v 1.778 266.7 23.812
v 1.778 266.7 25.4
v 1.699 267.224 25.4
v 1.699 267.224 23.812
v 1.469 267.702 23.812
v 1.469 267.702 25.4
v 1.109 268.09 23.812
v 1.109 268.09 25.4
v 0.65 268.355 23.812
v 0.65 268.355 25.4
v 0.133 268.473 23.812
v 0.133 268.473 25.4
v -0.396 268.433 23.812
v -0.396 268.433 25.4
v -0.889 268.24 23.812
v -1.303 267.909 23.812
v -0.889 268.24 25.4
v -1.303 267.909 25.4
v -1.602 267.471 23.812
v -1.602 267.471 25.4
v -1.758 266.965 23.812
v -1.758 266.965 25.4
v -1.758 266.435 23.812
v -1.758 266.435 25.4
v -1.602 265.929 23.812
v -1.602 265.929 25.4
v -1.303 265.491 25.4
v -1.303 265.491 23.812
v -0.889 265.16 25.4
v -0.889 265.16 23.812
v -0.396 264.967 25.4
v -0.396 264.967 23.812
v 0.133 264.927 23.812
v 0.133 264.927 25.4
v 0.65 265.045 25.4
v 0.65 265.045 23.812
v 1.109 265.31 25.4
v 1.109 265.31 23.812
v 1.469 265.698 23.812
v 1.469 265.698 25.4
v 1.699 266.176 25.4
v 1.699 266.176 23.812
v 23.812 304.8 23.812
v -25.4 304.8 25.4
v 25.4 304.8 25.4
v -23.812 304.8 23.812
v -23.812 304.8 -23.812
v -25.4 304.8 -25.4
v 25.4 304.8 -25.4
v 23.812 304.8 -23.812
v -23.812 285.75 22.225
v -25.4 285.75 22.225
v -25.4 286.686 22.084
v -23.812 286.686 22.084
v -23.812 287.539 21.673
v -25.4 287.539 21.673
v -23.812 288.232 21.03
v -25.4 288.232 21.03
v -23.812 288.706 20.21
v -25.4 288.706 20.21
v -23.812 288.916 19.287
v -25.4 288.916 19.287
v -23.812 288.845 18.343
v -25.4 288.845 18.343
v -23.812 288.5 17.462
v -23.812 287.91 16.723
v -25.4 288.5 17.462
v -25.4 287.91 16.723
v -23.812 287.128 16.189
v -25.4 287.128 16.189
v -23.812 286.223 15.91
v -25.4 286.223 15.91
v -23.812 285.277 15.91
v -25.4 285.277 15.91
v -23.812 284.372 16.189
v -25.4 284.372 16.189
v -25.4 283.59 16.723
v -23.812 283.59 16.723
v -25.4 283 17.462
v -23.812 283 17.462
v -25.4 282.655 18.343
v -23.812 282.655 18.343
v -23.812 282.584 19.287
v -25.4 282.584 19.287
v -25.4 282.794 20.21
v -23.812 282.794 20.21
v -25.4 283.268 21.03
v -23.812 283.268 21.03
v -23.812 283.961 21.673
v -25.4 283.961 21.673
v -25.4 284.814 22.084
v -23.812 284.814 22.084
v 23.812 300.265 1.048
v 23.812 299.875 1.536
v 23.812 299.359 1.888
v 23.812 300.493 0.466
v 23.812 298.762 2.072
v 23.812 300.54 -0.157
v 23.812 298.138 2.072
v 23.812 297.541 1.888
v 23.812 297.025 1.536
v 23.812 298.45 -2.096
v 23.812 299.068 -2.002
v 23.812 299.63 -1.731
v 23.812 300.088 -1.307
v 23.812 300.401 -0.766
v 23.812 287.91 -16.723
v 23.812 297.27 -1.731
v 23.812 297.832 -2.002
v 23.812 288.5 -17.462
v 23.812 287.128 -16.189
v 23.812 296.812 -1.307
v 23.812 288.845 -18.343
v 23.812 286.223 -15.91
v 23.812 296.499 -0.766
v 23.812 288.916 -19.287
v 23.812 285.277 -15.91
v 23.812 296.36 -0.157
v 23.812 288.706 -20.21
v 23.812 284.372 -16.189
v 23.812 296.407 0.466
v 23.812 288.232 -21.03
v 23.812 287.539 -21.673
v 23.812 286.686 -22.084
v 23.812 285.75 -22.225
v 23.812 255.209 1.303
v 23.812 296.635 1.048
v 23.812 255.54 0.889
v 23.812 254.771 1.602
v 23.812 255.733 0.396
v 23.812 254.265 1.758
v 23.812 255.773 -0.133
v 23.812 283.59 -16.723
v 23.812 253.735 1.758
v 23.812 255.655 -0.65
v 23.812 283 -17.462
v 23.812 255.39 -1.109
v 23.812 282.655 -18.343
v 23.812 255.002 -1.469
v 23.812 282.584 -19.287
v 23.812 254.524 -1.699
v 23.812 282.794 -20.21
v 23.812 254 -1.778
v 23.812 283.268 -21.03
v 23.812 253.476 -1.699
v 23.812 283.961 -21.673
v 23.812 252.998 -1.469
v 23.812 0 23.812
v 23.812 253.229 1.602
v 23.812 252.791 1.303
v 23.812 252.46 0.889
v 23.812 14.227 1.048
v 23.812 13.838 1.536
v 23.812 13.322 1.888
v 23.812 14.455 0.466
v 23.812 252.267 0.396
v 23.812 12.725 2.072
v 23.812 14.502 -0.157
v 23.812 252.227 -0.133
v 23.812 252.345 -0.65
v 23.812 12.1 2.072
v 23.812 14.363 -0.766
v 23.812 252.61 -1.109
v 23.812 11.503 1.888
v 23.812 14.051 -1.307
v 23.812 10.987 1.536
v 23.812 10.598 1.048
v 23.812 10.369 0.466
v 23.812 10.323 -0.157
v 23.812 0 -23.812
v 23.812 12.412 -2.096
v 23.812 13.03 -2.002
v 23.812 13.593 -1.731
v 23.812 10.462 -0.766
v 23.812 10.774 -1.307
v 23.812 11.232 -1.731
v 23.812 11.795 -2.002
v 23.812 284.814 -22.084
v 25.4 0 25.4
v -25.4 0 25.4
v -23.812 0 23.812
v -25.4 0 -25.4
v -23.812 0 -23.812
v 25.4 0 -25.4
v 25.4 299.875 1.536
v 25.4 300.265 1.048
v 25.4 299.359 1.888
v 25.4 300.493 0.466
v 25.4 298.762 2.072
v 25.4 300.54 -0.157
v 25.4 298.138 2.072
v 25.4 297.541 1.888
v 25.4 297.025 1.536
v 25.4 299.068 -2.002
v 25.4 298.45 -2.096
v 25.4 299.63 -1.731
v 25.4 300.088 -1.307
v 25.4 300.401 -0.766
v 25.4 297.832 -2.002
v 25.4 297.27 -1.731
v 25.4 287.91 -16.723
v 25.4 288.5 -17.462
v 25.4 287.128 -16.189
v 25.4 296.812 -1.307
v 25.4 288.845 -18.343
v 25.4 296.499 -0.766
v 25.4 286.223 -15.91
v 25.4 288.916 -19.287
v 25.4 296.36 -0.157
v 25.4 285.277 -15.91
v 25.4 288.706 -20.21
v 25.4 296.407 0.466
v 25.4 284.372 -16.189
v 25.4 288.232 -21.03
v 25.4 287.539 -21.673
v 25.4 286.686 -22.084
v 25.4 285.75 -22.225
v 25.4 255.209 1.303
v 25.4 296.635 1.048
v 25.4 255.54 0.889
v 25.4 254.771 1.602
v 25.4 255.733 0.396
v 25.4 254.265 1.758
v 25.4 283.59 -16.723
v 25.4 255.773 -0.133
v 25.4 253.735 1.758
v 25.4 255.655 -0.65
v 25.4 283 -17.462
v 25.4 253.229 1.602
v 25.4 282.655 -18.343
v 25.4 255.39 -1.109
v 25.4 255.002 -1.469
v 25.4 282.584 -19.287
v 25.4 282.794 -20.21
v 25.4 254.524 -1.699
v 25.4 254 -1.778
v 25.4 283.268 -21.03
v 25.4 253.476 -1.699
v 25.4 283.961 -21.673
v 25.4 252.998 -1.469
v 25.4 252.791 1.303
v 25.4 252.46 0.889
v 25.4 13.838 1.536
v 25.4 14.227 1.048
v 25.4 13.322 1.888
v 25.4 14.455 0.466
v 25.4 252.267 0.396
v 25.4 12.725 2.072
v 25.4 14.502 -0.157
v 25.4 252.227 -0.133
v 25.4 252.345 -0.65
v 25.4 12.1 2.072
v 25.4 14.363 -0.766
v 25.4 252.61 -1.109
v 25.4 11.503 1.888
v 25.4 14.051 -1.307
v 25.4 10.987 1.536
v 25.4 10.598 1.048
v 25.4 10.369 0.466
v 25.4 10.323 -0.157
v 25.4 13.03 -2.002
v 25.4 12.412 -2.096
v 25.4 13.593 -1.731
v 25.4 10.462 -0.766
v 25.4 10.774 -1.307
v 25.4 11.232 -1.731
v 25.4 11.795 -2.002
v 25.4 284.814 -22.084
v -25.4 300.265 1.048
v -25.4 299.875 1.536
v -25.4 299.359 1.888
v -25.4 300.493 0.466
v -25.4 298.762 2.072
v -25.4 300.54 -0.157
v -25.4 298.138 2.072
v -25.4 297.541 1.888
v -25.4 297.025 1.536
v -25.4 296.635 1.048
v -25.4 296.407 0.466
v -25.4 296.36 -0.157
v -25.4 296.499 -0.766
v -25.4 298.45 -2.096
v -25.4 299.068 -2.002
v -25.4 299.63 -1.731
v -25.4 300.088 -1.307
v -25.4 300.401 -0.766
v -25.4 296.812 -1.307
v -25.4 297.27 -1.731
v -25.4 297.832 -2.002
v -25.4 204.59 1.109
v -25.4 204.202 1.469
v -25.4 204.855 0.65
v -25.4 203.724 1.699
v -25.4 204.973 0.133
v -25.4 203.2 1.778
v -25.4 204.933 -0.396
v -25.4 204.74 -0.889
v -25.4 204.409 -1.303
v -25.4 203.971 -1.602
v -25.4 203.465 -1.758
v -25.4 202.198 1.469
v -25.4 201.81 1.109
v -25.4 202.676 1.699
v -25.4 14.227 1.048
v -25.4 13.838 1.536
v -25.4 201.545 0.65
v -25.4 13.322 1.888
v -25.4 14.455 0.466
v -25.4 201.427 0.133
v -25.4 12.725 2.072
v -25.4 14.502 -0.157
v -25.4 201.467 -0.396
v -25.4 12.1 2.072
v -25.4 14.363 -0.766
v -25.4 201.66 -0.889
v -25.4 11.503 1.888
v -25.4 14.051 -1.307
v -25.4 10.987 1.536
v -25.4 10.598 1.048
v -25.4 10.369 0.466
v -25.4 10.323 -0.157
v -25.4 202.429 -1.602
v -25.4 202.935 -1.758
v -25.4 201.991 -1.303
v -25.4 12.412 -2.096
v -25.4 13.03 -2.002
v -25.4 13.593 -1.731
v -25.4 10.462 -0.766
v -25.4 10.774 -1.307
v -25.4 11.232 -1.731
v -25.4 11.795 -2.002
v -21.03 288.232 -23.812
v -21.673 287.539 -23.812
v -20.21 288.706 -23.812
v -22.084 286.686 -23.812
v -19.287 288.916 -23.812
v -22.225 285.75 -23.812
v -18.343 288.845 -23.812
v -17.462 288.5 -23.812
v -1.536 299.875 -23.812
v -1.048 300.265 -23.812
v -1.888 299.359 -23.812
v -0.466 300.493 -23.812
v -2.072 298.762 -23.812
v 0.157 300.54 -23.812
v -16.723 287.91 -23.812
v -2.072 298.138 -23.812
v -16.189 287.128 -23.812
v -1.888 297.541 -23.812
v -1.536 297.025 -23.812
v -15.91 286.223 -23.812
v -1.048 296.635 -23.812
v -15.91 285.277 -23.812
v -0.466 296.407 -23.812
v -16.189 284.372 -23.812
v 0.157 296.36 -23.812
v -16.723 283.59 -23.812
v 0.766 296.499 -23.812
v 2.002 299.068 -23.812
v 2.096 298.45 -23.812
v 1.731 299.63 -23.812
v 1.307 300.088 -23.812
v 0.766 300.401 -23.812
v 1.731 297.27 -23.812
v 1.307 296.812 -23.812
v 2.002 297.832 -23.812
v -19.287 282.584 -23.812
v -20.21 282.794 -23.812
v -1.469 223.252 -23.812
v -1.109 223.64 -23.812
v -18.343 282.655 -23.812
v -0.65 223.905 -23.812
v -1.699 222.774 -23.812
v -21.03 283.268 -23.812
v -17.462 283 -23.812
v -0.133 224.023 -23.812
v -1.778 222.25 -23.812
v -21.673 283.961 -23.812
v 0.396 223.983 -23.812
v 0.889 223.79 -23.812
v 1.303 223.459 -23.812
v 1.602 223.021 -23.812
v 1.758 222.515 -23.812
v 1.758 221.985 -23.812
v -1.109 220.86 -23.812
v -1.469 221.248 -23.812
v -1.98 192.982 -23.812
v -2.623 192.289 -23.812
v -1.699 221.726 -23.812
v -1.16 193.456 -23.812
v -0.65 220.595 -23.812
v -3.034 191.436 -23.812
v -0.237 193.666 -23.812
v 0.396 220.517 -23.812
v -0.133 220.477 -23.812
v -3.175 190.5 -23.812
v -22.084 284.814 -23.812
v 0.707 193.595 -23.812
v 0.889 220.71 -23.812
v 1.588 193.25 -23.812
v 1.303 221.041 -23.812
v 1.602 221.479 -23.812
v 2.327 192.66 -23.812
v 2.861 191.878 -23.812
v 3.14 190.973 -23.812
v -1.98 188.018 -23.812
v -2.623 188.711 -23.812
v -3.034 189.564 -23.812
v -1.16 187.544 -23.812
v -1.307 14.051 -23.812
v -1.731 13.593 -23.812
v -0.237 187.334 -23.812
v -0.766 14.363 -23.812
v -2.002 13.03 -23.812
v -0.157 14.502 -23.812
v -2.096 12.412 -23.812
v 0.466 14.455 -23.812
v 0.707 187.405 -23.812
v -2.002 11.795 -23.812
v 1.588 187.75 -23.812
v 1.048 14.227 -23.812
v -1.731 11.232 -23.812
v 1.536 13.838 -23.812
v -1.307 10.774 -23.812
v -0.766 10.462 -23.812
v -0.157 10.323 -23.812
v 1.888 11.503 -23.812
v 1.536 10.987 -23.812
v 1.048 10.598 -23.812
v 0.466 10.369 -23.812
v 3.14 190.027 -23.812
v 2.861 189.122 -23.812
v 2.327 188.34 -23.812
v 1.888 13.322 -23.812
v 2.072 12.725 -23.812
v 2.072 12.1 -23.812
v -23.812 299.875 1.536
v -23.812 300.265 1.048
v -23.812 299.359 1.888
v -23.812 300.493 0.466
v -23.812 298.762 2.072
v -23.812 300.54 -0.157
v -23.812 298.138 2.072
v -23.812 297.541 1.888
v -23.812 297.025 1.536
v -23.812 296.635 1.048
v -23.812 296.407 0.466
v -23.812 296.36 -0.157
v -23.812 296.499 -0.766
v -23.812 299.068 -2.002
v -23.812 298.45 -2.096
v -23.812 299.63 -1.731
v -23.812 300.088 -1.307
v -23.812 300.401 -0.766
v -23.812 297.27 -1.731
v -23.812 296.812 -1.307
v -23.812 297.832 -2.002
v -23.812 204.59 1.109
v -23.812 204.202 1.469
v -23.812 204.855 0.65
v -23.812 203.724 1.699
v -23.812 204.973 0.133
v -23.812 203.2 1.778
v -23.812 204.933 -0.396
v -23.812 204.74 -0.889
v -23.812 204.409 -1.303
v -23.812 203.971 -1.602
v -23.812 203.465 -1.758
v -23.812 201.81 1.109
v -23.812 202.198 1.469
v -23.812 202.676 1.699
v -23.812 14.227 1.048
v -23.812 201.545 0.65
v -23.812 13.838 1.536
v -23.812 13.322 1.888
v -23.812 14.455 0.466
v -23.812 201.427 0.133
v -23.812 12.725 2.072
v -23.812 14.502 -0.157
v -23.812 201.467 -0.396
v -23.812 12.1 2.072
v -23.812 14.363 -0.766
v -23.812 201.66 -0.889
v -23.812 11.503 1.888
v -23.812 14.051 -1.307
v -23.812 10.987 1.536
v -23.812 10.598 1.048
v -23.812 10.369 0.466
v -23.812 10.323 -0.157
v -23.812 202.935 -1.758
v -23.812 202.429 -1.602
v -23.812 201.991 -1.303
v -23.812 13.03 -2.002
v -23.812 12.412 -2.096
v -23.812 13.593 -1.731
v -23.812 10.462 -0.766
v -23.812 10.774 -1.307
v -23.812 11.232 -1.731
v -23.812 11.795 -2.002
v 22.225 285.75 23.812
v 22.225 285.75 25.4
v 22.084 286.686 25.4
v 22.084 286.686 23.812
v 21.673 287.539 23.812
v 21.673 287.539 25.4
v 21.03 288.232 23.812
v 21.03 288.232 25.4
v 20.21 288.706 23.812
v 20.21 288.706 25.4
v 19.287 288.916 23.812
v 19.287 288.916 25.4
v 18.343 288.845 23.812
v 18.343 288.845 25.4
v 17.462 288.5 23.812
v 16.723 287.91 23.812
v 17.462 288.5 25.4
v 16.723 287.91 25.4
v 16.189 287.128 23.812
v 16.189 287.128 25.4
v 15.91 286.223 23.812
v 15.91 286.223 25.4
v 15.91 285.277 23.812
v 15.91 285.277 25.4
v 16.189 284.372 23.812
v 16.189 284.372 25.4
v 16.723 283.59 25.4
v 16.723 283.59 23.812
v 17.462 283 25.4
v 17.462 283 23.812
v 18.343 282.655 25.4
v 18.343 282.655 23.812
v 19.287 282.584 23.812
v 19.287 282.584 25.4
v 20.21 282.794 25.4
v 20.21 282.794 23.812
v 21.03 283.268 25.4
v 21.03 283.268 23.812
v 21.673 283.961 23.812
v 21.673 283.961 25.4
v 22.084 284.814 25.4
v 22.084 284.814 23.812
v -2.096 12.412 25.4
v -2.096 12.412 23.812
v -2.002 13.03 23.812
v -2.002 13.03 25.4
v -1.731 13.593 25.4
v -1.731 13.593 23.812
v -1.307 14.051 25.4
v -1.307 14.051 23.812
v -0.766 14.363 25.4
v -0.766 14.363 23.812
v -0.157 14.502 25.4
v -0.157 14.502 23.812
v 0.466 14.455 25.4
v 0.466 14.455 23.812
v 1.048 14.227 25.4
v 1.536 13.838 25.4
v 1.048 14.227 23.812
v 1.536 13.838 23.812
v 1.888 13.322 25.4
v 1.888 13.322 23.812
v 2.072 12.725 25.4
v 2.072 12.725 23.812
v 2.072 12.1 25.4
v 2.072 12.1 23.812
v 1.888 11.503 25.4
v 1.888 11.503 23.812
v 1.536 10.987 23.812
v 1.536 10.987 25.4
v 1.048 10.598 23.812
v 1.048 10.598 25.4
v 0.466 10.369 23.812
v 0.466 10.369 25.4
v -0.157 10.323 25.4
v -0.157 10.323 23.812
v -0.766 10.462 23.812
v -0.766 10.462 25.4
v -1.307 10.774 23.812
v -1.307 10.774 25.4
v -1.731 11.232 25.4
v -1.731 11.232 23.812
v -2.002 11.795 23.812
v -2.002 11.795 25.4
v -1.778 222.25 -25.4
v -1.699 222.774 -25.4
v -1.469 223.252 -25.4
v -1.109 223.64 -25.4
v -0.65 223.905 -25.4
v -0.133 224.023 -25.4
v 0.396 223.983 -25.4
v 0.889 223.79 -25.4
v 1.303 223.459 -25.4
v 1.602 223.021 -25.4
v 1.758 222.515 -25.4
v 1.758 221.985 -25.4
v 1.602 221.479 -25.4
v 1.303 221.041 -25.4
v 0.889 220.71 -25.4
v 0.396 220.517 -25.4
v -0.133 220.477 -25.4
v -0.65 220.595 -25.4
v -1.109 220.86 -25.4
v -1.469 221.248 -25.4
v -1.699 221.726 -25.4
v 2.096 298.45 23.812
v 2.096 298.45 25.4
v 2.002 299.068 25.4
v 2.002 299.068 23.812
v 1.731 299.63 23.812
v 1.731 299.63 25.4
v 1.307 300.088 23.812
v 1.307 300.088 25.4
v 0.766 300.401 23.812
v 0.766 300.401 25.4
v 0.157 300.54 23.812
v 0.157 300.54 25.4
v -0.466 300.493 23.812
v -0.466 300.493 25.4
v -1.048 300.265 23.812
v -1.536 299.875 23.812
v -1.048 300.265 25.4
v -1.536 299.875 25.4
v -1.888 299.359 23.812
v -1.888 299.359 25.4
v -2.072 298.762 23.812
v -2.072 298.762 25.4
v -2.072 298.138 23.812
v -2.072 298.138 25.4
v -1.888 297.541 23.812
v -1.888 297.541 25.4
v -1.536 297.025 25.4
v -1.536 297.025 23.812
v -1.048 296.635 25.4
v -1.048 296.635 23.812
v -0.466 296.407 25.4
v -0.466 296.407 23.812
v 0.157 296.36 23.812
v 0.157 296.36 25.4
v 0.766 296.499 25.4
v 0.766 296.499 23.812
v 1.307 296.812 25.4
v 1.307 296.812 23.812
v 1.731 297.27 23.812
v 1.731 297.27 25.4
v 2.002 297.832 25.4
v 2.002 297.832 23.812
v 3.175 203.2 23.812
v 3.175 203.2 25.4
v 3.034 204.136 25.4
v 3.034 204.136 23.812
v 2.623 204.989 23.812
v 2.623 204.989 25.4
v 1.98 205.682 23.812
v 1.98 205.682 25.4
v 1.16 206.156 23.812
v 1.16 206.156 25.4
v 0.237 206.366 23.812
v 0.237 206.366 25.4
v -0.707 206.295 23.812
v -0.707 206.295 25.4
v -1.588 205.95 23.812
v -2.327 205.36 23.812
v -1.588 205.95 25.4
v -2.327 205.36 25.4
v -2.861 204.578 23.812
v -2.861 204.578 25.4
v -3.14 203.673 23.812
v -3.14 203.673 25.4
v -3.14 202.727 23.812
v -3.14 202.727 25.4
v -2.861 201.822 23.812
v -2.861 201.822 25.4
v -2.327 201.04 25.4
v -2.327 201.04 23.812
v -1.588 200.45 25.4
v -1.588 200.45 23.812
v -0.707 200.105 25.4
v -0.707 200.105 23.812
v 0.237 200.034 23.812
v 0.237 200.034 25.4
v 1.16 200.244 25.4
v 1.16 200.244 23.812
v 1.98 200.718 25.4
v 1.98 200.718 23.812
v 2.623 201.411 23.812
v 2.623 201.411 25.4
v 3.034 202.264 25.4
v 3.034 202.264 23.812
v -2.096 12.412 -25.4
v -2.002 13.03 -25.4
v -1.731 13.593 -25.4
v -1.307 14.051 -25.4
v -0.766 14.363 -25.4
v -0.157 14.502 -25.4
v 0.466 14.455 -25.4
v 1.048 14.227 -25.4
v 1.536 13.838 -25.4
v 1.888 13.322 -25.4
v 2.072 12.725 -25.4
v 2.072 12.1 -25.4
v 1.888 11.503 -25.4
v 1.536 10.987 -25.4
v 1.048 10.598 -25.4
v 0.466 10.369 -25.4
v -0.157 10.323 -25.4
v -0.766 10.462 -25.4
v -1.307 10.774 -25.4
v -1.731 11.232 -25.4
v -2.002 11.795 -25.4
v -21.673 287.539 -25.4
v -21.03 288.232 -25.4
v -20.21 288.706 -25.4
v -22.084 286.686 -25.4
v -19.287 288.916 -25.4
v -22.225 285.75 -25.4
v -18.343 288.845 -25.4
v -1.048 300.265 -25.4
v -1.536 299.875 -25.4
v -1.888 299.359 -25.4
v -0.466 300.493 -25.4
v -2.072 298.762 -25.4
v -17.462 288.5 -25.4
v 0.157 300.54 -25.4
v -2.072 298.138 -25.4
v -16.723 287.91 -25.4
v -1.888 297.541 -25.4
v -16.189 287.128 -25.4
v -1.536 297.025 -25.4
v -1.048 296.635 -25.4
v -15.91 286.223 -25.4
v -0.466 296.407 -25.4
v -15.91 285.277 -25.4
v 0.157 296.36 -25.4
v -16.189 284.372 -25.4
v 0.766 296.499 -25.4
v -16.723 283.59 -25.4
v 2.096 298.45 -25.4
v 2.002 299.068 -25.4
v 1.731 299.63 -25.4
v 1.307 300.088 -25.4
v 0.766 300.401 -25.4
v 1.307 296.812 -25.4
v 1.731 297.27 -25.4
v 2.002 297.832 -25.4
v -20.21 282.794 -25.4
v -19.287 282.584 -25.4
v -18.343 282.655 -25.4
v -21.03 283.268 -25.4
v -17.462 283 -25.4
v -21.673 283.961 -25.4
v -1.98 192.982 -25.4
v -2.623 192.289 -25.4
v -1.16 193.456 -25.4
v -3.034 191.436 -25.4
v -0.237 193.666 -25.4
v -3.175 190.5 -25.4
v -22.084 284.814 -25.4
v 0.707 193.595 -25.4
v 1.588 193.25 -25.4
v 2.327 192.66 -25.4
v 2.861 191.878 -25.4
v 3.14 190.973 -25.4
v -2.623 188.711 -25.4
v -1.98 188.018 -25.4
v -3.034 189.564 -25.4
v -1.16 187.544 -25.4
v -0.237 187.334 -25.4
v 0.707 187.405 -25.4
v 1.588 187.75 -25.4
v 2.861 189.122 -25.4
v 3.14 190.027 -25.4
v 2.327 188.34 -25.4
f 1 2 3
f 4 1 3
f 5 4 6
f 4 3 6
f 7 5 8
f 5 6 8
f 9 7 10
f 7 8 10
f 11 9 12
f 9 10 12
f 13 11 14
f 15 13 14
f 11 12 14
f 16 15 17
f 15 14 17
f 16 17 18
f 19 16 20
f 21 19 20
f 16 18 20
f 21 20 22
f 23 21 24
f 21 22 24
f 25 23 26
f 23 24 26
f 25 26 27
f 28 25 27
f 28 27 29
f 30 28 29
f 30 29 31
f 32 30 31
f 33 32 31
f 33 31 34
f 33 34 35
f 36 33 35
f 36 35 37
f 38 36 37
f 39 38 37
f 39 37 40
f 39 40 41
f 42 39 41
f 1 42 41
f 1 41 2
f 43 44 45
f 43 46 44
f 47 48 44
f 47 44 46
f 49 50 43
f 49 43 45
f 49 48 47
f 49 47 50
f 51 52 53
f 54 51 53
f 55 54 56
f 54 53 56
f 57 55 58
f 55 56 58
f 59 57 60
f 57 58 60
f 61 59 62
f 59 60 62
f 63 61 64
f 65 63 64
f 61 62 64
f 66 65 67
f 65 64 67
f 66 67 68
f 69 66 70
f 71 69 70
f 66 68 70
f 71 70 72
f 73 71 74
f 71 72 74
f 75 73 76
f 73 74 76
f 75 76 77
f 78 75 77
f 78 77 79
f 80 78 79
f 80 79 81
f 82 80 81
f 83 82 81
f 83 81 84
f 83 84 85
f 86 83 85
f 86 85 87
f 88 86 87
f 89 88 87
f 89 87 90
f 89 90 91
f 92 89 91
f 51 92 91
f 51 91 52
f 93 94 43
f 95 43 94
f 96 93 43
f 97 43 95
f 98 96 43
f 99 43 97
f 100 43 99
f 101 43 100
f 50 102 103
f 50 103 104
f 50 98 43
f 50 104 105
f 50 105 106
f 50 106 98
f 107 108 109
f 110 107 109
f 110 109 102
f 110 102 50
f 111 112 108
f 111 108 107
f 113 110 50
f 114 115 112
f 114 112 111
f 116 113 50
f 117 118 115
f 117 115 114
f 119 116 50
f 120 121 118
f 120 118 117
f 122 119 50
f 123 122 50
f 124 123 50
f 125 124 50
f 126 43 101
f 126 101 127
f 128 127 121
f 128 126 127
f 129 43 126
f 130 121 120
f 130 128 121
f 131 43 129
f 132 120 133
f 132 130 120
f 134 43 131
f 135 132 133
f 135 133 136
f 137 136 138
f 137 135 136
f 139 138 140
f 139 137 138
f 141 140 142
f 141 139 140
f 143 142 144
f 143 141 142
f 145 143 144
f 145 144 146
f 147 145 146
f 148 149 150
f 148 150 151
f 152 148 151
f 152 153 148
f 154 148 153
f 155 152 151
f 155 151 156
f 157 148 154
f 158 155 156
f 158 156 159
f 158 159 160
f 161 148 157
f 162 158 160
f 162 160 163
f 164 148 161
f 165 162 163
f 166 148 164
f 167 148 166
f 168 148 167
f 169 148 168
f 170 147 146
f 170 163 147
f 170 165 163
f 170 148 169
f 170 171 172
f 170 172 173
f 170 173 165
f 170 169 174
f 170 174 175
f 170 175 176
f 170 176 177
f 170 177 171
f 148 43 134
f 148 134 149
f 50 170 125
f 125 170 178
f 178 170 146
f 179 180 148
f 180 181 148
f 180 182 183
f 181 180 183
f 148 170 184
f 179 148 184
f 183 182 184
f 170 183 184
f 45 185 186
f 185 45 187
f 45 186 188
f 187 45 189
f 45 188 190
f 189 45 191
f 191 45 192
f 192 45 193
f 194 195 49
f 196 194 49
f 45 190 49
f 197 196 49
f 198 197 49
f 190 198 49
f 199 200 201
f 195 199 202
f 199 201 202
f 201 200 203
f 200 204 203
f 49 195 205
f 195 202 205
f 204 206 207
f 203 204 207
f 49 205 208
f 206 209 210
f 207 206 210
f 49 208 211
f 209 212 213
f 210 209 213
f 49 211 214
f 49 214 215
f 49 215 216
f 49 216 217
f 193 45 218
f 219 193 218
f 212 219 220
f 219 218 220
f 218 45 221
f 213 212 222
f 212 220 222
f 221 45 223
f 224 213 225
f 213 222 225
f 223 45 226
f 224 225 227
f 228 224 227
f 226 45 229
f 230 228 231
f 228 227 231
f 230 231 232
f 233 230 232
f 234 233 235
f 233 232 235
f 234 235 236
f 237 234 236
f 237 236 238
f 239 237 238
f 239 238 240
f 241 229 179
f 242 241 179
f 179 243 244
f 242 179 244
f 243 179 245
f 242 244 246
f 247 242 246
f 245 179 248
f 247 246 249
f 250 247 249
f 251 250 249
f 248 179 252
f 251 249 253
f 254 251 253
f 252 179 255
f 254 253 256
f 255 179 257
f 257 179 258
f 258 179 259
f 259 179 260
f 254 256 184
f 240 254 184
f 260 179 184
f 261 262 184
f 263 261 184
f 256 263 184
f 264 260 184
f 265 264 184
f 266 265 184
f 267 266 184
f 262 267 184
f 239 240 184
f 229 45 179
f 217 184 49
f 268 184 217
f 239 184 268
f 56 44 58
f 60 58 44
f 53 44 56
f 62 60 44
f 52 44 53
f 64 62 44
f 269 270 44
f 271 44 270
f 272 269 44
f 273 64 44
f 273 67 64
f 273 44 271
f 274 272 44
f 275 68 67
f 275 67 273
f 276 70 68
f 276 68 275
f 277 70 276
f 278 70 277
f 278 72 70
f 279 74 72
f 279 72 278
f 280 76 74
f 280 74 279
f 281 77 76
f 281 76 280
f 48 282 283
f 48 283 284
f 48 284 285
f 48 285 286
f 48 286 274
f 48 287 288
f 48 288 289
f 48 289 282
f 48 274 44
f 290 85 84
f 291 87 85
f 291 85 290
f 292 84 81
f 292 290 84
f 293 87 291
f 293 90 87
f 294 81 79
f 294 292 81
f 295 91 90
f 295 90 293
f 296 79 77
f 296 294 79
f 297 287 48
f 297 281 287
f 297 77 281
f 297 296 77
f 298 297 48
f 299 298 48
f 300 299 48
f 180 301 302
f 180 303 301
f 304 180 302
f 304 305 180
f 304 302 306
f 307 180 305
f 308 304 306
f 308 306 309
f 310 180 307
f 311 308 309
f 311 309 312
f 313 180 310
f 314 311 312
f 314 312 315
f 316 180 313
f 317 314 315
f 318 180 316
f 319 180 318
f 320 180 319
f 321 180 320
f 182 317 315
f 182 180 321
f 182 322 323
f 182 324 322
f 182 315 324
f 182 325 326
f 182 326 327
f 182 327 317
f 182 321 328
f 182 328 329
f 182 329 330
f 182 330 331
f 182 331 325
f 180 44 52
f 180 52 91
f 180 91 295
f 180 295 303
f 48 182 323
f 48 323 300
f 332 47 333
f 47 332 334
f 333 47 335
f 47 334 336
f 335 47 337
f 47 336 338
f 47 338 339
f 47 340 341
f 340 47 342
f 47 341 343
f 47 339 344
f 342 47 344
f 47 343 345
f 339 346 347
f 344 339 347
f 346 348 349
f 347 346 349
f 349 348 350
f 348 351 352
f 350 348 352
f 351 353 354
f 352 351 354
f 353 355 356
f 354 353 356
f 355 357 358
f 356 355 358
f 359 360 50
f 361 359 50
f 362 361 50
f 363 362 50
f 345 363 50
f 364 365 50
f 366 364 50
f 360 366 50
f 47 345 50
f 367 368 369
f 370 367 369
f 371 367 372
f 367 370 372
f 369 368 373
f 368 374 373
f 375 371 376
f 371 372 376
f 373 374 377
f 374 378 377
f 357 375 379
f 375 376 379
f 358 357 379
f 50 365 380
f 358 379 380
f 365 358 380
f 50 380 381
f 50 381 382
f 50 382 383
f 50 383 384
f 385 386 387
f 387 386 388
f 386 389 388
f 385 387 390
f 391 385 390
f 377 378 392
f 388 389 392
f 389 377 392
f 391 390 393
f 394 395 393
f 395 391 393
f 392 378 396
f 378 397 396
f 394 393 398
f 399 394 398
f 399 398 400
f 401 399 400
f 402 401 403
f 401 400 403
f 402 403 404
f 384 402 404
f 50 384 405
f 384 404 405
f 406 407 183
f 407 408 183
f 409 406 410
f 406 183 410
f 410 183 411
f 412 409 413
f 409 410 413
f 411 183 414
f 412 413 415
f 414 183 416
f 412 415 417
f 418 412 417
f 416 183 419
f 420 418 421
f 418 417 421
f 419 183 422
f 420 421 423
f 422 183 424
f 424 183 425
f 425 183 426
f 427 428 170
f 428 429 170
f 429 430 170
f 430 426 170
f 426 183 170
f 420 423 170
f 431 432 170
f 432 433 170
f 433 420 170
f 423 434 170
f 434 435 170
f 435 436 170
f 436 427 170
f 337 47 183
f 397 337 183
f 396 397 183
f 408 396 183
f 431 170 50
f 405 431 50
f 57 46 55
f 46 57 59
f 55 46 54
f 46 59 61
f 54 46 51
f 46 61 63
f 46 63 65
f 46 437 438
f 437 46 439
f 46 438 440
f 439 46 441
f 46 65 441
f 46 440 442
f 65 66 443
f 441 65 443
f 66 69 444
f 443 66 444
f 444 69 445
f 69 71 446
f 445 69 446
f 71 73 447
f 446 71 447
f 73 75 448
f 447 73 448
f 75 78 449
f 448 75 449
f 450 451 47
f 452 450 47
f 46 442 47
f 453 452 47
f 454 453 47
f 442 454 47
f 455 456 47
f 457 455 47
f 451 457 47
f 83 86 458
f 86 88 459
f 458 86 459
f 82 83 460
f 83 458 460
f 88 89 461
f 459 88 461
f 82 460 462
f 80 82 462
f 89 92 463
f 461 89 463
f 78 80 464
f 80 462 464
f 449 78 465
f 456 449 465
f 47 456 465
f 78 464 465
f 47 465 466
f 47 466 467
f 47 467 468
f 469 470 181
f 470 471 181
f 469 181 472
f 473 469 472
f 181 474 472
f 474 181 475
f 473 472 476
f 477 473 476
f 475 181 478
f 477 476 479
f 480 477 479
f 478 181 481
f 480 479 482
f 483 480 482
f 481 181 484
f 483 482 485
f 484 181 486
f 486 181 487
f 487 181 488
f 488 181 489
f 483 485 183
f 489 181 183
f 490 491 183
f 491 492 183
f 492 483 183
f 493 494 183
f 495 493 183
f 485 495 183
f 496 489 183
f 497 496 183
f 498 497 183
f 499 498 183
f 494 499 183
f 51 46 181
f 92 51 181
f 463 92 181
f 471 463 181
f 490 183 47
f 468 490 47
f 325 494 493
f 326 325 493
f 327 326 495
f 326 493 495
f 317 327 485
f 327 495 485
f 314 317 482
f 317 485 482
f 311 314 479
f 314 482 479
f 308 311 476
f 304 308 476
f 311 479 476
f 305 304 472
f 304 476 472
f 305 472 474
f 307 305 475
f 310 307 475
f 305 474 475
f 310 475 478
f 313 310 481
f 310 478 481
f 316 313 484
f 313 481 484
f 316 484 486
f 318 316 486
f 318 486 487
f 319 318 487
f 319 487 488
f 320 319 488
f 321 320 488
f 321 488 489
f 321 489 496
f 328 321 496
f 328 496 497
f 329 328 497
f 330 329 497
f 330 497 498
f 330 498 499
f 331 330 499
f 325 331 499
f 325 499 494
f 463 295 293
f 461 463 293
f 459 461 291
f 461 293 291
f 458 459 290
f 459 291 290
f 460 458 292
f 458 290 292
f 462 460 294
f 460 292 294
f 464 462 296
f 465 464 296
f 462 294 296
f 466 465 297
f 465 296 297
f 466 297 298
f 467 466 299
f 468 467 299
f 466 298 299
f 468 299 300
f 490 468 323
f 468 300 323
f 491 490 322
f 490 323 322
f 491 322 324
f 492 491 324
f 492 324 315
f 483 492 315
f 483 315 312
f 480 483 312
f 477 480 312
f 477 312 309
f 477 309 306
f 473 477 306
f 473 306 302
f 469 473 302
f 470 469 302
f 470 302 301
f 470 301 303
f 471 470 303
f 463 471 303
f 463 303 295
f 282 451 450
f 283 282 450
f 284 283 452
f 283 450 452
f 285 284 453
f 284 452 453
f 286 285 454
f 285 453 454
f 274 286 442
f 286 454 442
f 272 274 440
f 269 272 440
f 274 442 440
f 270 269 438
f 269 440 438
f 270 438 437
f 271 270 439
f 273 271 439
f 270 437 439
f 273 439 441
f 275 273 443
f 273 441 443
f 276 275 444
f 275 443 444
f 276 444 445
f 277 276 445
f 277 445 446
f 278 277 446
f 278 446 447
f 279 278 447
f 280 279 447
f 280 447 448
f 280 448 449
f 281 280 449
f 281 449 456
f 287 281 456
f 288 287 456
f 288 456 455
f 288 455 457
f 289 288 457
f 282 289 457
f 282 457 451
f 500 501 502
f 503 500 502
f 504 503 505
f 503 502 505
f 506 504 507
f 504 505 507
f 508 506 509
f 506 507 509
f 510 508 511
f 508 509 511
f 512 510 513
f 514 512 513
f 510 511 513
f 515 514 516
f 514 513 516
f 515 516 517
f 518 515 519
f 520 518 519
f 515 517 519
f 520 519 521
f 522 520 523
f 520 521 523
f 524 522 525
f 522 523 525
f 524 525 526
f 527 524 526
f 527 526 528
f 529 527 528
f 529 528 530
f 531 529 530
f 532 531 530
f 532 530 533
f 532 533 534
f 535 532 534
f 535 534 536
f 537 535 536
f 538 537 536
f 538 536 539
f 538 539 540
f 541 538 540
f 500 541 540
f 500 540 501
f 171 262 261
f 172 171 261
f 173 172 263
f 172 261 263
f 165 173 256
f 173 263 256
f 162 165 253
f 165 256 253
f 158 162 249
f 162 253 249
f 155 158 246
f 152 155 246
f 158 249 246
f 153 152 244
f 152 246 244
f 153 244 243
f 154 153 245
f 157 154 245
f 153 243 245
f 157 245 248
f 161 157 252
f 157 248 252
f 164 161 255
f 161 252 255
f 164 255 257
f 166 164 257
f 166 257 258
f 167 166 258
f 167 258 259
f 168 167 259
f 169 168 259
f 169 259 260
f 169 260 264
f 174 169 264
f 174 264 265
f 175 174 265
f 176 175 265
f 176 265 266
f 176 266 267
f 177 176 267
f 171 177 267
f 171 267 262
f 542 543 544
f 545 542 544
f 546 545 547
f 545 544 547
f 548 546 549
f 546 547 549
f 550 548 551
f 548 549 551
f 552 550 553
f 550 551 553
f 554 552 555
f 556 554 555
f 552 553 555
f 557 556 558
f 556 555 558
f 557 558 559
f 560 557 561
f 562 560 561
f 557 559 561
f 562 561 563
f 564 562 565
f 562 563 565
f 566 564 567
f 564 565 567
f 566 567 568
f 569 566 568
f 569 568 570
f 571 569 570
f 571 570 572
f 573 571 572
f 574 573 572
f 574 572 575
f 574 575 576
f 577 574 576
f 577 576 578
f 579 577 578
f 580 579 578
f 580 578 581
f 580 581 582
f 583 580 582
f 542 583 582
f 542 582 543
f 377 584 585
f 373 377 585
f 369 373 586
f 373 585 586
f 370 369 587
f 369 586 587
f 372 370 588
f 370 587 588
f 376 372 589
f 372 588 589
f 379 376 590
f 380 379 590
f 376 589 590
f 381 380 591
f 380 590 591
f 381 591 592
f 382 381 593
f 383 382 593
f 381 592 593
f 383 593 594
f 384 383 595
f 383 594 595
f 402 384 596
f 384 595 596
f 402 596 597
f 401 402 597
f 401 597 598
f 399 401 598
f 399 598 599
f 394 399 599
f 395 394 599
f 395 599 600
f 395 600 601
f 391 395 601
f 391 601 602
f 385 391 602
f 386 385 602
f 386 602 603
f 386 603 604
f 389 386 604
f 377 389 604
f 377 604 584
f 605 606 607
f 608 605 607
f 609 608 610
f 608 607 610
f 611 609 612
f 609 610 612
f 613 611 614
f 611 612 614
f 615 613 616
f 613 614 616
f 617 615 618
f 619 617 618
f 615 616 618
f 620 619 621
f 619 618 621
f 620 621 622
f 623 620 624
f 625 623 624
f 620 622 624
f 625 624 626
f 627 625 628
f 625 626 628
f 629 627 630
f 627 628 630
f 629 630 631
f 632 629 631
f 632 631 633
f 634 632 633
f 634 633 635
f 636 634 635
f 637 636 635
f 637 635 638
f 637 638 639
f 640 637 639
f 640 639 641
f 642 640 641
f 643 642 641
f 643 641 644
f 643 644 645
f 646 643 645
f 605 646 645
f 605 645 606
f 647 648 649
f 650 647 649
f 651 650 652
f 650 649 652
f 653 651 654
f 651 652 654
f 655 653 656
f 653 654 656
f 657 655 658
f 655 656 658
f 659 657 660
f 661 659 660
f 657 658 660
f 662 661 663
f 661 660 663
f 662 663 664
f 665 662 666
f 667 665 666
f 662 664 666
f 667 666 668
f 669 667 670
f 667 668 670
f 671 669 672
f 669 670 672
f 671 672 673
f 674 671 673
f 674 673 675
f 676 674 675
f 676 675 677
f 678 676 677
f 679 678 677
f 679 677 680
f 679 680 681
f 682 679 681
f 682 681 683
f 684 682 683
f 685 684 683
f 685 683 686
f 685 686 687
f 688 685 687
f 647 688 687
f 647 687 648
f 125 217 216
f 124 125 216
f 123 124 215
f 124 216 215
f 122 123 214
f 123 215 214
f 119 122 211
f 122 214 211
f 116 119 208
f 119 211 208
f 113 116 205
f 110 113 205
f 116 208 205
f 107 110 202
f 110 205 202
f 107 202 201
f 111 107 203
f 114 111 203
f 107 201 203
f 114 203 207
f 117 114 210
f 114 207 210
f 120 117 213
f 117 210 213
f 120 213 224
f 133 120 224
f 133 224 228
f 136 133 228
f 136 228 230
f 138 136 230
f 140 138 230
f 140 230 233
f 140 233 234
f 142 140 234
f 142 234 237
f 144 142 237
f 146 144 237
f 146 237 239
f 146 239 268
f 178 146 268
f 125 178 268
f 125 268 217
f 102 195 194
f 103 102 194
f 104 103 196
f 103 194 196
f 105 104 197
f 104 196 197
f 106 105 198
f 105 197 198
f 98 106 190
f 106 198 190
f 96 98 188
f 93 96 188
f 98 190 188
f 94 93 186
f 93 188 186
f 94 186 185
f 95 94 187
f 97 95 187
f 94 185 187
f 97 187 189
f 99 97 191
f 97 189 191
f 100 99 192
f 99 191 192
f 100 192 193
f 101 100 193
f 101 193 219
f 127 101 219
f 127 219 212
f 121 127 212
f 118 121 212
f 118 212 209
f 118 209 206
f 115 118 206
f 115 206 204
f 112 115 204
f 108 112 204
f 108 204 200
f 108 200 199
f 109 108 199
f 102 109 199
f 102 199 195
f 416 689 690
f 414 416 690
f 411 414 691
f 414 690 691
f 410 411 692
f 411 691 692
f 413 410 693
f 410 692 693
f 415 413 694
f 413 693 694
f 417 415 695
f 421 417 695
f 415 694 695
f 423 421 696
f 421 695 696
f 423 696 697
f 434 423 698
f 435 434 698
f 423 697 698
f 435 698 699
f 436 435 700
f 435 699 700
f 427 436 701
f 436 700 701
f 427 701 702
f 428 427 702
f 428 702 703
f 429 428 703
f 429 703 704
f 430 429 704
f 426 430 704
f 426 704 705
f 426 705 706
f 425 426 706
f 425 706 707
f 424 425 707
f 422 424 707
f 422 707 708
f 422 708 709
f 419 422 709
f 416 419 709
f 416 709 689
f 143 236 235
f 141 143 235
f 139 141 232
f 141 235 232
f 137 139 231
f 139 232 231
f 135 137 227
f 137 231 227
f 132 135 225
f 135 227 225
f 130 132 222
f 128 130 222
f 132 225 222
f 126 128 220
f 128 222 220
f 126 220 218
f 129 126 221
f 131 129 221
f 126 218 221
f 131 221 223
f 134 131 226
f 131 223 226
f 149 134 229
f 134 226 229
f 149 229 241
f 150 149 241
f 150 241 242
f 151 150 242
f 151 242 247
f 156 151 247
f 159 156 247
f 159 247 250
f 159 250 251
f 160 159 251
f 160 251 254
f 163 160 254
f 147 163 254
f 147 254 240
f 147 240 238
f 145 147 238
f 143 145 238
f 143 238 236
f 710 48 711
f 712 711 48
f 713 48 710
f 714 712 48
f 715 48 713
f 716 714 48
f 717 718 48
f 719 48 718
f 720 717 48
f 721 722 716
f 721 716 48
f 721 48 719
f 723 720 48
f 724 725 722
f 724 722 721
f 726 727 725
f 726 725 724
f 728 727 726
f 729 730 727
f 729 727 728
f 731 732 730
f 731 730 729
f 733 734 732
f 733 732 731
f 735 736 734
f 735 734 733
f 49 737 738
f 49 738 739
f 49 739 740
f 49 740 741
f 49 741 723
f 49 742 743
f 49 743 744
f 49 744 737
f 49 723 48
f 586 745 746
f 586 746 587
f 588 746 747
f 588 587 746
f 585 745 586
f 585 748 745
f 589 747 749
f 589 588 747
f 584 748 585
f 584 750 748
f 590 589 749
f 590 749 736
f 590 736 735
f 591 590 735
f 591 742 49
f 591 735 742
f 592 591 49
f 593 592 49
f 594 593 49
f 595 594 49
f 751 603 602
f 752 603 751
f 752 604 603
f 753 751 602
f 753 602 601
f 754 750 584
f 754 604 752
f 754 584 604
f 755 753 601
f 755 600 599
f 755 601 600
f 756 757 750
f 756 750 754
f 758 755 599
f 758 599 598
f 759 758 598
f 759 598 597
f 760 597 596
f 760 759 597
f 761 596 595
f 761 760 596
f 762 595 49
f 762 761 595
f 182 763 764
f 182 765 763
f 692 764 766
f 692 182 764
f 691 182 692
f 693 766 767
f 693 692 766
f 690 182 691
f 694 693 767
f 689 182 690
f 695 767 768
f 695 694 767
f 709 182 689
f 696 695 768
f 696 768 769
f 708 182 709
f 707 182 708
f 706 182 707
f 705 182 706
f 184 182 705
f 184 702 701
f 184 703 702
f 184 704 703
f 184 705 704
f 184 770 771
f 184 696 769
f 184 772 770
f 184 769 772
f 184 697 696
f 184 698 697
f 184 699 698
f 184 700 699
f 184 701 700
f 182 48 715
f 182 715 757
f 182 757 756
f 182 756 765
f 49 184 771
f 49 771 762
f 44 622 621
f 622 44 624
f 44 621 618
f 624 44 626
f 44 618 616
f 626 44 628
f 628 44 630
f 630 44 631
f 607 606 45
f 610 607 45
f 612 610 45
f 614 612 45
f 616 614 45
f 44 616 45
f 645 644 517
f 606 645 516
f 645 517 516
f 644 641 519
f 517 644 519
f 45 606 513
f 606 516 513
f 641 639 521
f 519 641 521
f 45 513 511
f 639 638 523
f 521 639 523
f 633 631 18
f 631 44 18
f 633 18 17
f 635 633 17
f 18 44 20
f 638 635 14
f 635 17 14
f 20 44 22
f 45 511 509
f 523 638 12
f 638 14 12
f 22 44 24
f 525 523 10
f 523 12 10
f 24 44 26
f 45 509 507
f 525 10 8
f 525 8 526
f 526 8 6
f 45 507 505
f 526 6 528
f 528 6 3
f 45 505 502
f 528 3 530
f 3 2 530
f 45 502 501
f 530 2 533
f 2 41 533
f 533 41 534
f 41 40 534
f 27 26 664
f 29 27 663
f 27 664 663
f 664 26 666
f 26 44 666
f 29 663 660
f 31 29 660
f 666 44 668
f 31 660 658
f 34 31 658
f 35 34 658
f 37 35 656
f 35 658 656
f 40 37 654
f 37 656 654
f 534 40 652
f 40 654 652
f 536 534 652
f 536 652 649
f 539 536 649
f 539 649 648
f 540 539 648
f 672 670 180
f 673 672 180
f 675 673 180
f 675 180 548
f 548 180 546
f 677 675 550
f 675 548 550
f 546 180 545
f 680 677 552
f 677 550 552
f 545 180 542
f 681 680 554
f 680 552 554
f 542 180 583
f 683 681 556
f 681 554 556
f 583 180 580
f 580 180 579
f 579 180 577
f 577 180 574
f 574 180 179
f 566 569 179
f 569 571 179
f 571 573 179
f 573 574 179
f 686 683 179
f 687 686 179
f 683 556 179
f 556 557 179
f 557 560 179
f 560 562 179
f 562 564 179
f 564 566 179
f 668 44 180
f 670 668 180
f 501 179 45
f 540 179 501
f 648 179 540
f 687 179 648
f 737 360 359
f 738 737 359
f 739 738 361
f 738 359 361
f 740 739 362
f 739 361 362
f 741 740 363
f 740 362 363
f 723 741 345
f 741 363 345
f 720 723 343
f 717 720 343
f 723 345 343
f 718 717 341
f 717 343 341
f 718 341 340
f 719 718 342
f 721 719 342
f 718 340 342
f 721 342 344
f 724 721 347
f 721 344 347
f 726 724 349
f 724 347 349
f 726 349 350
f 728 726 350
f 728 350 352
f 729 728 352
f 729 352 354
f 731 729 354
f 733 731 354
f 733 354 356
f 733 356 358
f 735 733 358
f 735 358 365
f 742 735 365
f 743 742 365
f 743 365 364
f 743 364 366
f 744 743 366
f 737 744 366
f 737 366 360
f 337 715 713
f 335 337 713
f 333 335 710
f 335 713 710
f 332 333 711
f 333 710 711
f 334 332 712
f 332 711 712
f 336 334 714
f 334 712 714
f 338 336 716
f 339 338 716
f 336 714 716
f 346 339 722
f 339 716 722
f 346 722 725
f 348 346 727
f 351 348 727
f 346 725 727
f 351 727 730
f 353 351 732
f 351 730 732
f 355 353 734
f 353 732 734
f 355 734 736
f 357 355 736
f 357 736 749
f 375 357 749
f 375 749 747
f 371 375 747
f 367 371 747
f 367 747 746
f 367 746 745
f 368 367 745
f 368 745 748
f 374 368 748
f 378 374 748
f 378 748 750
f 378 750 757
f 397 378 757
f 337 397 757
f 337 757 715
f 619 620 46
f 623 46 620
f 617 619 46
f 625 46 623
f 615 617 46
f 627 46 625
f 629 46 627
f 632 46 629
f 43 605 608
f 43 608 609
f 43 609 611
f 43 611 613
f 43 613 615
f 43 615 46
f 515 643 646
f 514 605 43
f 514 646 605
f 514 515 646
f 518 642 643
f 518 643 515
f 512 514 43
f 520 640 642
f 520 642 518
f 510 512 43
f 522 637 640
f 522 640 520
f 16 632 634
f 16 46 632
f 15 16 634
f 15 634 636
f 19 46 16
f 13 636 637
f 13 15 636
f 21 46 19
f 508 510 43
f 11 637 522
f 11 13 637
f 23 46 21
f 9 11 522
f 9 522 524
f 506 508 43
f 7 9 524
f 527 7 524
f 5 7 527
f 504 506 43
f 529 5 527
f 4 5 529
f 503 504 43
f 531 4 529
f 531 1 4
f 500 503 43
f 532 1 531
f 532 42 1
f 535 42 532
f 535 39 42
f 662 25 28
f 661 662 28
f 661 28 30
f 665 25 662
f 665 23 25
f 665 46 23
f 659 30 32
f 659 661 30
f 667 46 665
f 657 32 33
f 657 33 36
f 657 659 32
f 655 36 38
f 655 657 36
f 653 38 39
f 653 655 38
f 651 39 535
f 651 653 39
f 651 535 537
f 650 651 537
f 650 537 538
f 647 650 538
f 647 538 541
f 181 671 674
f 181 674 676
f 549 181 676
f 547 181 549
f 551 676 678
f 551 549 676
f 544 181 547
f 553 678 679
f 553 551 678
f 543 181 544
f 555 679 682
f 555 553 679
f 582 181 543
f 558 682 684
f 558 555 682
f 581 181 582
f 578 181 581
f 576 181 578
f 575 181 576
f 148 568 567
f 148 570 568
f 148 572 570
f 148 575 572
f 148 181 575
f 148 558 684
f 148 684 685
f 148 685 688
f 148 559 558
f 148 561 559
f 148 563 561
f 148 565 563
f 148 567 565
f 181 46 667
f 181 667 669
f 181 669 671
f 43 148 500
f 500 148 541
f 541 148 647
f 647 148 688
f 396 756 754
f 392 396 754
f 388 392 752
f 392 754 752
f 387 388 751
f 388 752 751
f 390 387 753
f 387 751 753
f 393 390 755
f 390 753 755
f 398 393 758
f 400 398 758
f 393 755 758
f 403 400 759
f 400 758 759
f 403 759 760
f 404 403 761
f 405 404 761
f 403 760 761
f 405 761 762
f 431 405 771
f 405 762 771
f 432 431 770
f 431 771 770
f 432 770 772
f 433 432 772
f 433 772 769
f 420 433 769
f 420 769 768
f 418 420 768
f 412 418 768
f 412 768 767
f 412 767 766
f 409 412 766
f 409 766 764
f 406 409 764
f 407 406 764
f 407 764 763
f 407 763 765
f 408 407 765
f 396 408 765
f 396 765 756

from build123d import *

# Parameters (mm, degrees)
SKETCH1_W               = 50.8
SKETCH1_H               = 50.8
SKETCH1_W_2             = 47.625
SKETCH1_H_2             = 47.625
BOSS_EXTRUDE1_DEPTH     = 304.8
SKETCH6_R               = 2.0955
CUT_EXTRUDE3_DEPTH      = 1
CUT_EXTRUDE3_DEPTH_BACK = 51.8
SKETCH7_R               = 2.0955
CUT_EXTRUDE4_DEPTH      = 1
CUT_EXTRUDE4_DEPTH_BACK = 51.8
SKETCH8_R               = 2.0955
CUT_EXTRUDE5_DEPTH      = 51.8
SKETCH9_R               = 2.0955
CUT_EXTRUDE6_DEPTH      = 51.8
SKETCH10_R              = 3.175
CUT_EXTRUDE7_DEPTH      = 5.08
SKETCH11_R              = 3.175
CUT_EXTRUDE8_DEPTH      = 5.08
SKETCH12_R              = 3.175
CUT_EXTRUDE9_DEPTH      = 5.08
SKETCH13_R              = 3.175
CUT_EXTRUDE10_DEPTH     = 5.08
SKETCH15_R              = 1.778
SKETCH15_R_2            = 3.175
CUT_EXTRUDE12_DEPTH     = 5.08
SKETCH16_R              = 1.778
CUT_EXTRUDE13_DEPTH     = 5.08
SKETCH17_R              = 1.778
CUT_EXTRUDE14_DEPTH     = 5.08
SKETCH19_R              = 1.778
SKETCH19_R_2            = 3.175
CUT_EXTRUDE15_DEPTH     = 5.08


with BuildPart() as part:
    # Sketch1 → Boss-Extrude1 (new body)
    with BuildSketch(Plane(origin=(0, 0, 0), x_dir=(1, 0, 0), z_dir=(0, 1, 0))):
        Rectangle(SKETCH1_W, SKETCH1_H)
        Rectangle(SKETCH1_W_2, SKETCH1_H_2, mode=Mode.SUBTRACT)
    extrude(amount=BOSS_EXTRUDE1_DEPTH)

    # Sketch6 → Cut-Extrude3 (cut, two sides)
    with BuildSketch(Plane(origin=(25.4, 0, 0), x_dir=(0, 0, -1), z_dir=(1, 0, 0))) as cut_extrude3_sk:
        with Locations((0, 12.412400118)):
            Circle(SKETCH6_R)
    extrude(amount=CUT_EXTRUDE3_DEPTH, mode=Mode.SUBTRACT)
    extrude(cut_extrude3_sk.sketch, amount=-CUT_EXTRUDE3_DEPTH_BACK, mode=Mode.SUBTRACT)

    # Sketch7 → Cut-Extrude4 (cut, two sides)
    with BuildSketch(Plane(origin=(0, 0, -25.4), x_dir=(-1, 0, 0), z_dir=(0, 0, -1))) as cut_extrude4_sk:
        with Locations((0, 12.412400118)):
            Circle(SKETCH7_R)
    extrude(amount=CUT_EXTRUDE4_DEPTH, mode=Mode.SUBTRACT)
    extrude(cut_extrude4_sk.sketch, amount=-CUT_EXTRUDE4_DEPTH_BACK, mode=Mode.SUBTRACT)

    # Sketch8 → Cut-Extrude5 (cut, through all)
    with BuildSketch(Plane(origin=(25.4, 0, 0), x_dir=(0, 0, -1), z_dir=(1, 0, 0))):
        with Locations((0, 298.45)):
            Circle(SKETCH8_R)
    extrude(amount=-CUT_EXTRUDE5_DEPTH, mode=Mode.SUBTRACT)

    # Sketch9 → Cut-Extrude6 (cut, through all)
    with BuildSketch(Plane.XY.offset(25.4)):
        with Locations((0, 298.45)):
            Circle(SKETCH9_R)
    extrude(amount=-CUT_EXTRUDE6_DEPTH, mode=Mode.SUBTRACT)

    # Sketch10 → Cut-Extrude7 (cut)
    with BuildSketch(Plane.XY.offset(25.4)):
        with Locations((19.05, 285.75)):
            Circle(SKETCH10_R)
    extrude(amount=-CUT_EXTRUDE7_DEPTH, mode=Mode.SUBTRACT)

    # Sketch11 → Cut-Extrude8 (cut)
    with BuildSketch(Plane.ZY.offset(25.4)):
        with Locations((19.05, 285.75)):
            Circle(SKETCH11_R)
    extrude(amount=-CUT_EXTRUDE8_DEPTH, mode=Mode.SUBTRACT)

    # Sketch12 → Cut-Extrude9 (cut)
    with BuildSketch(Plane(origin=(0, 0, -25.4), x_dir=(-1, 0, 0), z_dir=(0, 0, -1))):
        with Locations((19.05, 285.75)):
            Circle(SKETCH12_R)
    extrude(amount=-CUT_EXTRUDE9_DEPTH, mode=Mode.SUBTRACT)

    # Sketch13 → Cut-Extrude10 (cut)
    with BuildSketch(Plane(origin=(25.4, 0, 0), x_dir=(0, 0, -1), z_dir=(1, 0, 0))):
        with Locations((19.05, 285.75)):
            Circle(SKETCH13_R)
    extrude(amount=-CUT_EXTRUDE10_DEPTH, mode=Mode.SUBTRACT)

    # Sketch15 → Cut-Extrude12 (cut)
    with BuildSketch(Plane(origin=(0, 0, -25.4), x_dir=(-1, 0, 0), z_dir=(0, 0, -1))):
        with Locations((0, 222.25)):
            Circle(SKETCH15_R)
        with Locations((0, 190.5)):
            Circle(SKETCH15_R_2)
    extrude(amount=-CUT_EXTRUDE12_DEPTH, mode=Mode.SUBTRACT)

    # Sketch16 → Cut-Extrude13 (cut)
    with BuildSketch(Plane(origin=(25.4, 0, 0), x_dir=(0, 0, -1), z_dir=(1, 0, 0))):
        with Locations((0, 254)):
            Circle(SKETCH16_R)
    extrude(amount=-CUT_EXTRUDE13_DEPTH, mode=Mode.SUBTRACT)

    # Sketch17 → Cut-Extrude14 (cut)
    with BuildSketch(Plane.ZY.offset(25.4)):
        with Locations((0, 203.2)):
            Circle(SKETCH17_R)
    extrude(amount=-CUT_EXTRUDE14_DEPTH, mode=Mode.SUBTRACT)

    # Sketch19 → Cut-Extrude15 (cut)
    with BuildSketch(Plane.XY.offset(25.4)):
        with Locations((0, 266.7)):
            Circle(SKETCH19_R)
        with Locations((0, 203.2)):
            Circle(SKETCH19_R_2)
    extrude(amount=-CUT_EXTRUDE15_DEPTH, mode=Mode.SUBTRACT)


solid = part.part
